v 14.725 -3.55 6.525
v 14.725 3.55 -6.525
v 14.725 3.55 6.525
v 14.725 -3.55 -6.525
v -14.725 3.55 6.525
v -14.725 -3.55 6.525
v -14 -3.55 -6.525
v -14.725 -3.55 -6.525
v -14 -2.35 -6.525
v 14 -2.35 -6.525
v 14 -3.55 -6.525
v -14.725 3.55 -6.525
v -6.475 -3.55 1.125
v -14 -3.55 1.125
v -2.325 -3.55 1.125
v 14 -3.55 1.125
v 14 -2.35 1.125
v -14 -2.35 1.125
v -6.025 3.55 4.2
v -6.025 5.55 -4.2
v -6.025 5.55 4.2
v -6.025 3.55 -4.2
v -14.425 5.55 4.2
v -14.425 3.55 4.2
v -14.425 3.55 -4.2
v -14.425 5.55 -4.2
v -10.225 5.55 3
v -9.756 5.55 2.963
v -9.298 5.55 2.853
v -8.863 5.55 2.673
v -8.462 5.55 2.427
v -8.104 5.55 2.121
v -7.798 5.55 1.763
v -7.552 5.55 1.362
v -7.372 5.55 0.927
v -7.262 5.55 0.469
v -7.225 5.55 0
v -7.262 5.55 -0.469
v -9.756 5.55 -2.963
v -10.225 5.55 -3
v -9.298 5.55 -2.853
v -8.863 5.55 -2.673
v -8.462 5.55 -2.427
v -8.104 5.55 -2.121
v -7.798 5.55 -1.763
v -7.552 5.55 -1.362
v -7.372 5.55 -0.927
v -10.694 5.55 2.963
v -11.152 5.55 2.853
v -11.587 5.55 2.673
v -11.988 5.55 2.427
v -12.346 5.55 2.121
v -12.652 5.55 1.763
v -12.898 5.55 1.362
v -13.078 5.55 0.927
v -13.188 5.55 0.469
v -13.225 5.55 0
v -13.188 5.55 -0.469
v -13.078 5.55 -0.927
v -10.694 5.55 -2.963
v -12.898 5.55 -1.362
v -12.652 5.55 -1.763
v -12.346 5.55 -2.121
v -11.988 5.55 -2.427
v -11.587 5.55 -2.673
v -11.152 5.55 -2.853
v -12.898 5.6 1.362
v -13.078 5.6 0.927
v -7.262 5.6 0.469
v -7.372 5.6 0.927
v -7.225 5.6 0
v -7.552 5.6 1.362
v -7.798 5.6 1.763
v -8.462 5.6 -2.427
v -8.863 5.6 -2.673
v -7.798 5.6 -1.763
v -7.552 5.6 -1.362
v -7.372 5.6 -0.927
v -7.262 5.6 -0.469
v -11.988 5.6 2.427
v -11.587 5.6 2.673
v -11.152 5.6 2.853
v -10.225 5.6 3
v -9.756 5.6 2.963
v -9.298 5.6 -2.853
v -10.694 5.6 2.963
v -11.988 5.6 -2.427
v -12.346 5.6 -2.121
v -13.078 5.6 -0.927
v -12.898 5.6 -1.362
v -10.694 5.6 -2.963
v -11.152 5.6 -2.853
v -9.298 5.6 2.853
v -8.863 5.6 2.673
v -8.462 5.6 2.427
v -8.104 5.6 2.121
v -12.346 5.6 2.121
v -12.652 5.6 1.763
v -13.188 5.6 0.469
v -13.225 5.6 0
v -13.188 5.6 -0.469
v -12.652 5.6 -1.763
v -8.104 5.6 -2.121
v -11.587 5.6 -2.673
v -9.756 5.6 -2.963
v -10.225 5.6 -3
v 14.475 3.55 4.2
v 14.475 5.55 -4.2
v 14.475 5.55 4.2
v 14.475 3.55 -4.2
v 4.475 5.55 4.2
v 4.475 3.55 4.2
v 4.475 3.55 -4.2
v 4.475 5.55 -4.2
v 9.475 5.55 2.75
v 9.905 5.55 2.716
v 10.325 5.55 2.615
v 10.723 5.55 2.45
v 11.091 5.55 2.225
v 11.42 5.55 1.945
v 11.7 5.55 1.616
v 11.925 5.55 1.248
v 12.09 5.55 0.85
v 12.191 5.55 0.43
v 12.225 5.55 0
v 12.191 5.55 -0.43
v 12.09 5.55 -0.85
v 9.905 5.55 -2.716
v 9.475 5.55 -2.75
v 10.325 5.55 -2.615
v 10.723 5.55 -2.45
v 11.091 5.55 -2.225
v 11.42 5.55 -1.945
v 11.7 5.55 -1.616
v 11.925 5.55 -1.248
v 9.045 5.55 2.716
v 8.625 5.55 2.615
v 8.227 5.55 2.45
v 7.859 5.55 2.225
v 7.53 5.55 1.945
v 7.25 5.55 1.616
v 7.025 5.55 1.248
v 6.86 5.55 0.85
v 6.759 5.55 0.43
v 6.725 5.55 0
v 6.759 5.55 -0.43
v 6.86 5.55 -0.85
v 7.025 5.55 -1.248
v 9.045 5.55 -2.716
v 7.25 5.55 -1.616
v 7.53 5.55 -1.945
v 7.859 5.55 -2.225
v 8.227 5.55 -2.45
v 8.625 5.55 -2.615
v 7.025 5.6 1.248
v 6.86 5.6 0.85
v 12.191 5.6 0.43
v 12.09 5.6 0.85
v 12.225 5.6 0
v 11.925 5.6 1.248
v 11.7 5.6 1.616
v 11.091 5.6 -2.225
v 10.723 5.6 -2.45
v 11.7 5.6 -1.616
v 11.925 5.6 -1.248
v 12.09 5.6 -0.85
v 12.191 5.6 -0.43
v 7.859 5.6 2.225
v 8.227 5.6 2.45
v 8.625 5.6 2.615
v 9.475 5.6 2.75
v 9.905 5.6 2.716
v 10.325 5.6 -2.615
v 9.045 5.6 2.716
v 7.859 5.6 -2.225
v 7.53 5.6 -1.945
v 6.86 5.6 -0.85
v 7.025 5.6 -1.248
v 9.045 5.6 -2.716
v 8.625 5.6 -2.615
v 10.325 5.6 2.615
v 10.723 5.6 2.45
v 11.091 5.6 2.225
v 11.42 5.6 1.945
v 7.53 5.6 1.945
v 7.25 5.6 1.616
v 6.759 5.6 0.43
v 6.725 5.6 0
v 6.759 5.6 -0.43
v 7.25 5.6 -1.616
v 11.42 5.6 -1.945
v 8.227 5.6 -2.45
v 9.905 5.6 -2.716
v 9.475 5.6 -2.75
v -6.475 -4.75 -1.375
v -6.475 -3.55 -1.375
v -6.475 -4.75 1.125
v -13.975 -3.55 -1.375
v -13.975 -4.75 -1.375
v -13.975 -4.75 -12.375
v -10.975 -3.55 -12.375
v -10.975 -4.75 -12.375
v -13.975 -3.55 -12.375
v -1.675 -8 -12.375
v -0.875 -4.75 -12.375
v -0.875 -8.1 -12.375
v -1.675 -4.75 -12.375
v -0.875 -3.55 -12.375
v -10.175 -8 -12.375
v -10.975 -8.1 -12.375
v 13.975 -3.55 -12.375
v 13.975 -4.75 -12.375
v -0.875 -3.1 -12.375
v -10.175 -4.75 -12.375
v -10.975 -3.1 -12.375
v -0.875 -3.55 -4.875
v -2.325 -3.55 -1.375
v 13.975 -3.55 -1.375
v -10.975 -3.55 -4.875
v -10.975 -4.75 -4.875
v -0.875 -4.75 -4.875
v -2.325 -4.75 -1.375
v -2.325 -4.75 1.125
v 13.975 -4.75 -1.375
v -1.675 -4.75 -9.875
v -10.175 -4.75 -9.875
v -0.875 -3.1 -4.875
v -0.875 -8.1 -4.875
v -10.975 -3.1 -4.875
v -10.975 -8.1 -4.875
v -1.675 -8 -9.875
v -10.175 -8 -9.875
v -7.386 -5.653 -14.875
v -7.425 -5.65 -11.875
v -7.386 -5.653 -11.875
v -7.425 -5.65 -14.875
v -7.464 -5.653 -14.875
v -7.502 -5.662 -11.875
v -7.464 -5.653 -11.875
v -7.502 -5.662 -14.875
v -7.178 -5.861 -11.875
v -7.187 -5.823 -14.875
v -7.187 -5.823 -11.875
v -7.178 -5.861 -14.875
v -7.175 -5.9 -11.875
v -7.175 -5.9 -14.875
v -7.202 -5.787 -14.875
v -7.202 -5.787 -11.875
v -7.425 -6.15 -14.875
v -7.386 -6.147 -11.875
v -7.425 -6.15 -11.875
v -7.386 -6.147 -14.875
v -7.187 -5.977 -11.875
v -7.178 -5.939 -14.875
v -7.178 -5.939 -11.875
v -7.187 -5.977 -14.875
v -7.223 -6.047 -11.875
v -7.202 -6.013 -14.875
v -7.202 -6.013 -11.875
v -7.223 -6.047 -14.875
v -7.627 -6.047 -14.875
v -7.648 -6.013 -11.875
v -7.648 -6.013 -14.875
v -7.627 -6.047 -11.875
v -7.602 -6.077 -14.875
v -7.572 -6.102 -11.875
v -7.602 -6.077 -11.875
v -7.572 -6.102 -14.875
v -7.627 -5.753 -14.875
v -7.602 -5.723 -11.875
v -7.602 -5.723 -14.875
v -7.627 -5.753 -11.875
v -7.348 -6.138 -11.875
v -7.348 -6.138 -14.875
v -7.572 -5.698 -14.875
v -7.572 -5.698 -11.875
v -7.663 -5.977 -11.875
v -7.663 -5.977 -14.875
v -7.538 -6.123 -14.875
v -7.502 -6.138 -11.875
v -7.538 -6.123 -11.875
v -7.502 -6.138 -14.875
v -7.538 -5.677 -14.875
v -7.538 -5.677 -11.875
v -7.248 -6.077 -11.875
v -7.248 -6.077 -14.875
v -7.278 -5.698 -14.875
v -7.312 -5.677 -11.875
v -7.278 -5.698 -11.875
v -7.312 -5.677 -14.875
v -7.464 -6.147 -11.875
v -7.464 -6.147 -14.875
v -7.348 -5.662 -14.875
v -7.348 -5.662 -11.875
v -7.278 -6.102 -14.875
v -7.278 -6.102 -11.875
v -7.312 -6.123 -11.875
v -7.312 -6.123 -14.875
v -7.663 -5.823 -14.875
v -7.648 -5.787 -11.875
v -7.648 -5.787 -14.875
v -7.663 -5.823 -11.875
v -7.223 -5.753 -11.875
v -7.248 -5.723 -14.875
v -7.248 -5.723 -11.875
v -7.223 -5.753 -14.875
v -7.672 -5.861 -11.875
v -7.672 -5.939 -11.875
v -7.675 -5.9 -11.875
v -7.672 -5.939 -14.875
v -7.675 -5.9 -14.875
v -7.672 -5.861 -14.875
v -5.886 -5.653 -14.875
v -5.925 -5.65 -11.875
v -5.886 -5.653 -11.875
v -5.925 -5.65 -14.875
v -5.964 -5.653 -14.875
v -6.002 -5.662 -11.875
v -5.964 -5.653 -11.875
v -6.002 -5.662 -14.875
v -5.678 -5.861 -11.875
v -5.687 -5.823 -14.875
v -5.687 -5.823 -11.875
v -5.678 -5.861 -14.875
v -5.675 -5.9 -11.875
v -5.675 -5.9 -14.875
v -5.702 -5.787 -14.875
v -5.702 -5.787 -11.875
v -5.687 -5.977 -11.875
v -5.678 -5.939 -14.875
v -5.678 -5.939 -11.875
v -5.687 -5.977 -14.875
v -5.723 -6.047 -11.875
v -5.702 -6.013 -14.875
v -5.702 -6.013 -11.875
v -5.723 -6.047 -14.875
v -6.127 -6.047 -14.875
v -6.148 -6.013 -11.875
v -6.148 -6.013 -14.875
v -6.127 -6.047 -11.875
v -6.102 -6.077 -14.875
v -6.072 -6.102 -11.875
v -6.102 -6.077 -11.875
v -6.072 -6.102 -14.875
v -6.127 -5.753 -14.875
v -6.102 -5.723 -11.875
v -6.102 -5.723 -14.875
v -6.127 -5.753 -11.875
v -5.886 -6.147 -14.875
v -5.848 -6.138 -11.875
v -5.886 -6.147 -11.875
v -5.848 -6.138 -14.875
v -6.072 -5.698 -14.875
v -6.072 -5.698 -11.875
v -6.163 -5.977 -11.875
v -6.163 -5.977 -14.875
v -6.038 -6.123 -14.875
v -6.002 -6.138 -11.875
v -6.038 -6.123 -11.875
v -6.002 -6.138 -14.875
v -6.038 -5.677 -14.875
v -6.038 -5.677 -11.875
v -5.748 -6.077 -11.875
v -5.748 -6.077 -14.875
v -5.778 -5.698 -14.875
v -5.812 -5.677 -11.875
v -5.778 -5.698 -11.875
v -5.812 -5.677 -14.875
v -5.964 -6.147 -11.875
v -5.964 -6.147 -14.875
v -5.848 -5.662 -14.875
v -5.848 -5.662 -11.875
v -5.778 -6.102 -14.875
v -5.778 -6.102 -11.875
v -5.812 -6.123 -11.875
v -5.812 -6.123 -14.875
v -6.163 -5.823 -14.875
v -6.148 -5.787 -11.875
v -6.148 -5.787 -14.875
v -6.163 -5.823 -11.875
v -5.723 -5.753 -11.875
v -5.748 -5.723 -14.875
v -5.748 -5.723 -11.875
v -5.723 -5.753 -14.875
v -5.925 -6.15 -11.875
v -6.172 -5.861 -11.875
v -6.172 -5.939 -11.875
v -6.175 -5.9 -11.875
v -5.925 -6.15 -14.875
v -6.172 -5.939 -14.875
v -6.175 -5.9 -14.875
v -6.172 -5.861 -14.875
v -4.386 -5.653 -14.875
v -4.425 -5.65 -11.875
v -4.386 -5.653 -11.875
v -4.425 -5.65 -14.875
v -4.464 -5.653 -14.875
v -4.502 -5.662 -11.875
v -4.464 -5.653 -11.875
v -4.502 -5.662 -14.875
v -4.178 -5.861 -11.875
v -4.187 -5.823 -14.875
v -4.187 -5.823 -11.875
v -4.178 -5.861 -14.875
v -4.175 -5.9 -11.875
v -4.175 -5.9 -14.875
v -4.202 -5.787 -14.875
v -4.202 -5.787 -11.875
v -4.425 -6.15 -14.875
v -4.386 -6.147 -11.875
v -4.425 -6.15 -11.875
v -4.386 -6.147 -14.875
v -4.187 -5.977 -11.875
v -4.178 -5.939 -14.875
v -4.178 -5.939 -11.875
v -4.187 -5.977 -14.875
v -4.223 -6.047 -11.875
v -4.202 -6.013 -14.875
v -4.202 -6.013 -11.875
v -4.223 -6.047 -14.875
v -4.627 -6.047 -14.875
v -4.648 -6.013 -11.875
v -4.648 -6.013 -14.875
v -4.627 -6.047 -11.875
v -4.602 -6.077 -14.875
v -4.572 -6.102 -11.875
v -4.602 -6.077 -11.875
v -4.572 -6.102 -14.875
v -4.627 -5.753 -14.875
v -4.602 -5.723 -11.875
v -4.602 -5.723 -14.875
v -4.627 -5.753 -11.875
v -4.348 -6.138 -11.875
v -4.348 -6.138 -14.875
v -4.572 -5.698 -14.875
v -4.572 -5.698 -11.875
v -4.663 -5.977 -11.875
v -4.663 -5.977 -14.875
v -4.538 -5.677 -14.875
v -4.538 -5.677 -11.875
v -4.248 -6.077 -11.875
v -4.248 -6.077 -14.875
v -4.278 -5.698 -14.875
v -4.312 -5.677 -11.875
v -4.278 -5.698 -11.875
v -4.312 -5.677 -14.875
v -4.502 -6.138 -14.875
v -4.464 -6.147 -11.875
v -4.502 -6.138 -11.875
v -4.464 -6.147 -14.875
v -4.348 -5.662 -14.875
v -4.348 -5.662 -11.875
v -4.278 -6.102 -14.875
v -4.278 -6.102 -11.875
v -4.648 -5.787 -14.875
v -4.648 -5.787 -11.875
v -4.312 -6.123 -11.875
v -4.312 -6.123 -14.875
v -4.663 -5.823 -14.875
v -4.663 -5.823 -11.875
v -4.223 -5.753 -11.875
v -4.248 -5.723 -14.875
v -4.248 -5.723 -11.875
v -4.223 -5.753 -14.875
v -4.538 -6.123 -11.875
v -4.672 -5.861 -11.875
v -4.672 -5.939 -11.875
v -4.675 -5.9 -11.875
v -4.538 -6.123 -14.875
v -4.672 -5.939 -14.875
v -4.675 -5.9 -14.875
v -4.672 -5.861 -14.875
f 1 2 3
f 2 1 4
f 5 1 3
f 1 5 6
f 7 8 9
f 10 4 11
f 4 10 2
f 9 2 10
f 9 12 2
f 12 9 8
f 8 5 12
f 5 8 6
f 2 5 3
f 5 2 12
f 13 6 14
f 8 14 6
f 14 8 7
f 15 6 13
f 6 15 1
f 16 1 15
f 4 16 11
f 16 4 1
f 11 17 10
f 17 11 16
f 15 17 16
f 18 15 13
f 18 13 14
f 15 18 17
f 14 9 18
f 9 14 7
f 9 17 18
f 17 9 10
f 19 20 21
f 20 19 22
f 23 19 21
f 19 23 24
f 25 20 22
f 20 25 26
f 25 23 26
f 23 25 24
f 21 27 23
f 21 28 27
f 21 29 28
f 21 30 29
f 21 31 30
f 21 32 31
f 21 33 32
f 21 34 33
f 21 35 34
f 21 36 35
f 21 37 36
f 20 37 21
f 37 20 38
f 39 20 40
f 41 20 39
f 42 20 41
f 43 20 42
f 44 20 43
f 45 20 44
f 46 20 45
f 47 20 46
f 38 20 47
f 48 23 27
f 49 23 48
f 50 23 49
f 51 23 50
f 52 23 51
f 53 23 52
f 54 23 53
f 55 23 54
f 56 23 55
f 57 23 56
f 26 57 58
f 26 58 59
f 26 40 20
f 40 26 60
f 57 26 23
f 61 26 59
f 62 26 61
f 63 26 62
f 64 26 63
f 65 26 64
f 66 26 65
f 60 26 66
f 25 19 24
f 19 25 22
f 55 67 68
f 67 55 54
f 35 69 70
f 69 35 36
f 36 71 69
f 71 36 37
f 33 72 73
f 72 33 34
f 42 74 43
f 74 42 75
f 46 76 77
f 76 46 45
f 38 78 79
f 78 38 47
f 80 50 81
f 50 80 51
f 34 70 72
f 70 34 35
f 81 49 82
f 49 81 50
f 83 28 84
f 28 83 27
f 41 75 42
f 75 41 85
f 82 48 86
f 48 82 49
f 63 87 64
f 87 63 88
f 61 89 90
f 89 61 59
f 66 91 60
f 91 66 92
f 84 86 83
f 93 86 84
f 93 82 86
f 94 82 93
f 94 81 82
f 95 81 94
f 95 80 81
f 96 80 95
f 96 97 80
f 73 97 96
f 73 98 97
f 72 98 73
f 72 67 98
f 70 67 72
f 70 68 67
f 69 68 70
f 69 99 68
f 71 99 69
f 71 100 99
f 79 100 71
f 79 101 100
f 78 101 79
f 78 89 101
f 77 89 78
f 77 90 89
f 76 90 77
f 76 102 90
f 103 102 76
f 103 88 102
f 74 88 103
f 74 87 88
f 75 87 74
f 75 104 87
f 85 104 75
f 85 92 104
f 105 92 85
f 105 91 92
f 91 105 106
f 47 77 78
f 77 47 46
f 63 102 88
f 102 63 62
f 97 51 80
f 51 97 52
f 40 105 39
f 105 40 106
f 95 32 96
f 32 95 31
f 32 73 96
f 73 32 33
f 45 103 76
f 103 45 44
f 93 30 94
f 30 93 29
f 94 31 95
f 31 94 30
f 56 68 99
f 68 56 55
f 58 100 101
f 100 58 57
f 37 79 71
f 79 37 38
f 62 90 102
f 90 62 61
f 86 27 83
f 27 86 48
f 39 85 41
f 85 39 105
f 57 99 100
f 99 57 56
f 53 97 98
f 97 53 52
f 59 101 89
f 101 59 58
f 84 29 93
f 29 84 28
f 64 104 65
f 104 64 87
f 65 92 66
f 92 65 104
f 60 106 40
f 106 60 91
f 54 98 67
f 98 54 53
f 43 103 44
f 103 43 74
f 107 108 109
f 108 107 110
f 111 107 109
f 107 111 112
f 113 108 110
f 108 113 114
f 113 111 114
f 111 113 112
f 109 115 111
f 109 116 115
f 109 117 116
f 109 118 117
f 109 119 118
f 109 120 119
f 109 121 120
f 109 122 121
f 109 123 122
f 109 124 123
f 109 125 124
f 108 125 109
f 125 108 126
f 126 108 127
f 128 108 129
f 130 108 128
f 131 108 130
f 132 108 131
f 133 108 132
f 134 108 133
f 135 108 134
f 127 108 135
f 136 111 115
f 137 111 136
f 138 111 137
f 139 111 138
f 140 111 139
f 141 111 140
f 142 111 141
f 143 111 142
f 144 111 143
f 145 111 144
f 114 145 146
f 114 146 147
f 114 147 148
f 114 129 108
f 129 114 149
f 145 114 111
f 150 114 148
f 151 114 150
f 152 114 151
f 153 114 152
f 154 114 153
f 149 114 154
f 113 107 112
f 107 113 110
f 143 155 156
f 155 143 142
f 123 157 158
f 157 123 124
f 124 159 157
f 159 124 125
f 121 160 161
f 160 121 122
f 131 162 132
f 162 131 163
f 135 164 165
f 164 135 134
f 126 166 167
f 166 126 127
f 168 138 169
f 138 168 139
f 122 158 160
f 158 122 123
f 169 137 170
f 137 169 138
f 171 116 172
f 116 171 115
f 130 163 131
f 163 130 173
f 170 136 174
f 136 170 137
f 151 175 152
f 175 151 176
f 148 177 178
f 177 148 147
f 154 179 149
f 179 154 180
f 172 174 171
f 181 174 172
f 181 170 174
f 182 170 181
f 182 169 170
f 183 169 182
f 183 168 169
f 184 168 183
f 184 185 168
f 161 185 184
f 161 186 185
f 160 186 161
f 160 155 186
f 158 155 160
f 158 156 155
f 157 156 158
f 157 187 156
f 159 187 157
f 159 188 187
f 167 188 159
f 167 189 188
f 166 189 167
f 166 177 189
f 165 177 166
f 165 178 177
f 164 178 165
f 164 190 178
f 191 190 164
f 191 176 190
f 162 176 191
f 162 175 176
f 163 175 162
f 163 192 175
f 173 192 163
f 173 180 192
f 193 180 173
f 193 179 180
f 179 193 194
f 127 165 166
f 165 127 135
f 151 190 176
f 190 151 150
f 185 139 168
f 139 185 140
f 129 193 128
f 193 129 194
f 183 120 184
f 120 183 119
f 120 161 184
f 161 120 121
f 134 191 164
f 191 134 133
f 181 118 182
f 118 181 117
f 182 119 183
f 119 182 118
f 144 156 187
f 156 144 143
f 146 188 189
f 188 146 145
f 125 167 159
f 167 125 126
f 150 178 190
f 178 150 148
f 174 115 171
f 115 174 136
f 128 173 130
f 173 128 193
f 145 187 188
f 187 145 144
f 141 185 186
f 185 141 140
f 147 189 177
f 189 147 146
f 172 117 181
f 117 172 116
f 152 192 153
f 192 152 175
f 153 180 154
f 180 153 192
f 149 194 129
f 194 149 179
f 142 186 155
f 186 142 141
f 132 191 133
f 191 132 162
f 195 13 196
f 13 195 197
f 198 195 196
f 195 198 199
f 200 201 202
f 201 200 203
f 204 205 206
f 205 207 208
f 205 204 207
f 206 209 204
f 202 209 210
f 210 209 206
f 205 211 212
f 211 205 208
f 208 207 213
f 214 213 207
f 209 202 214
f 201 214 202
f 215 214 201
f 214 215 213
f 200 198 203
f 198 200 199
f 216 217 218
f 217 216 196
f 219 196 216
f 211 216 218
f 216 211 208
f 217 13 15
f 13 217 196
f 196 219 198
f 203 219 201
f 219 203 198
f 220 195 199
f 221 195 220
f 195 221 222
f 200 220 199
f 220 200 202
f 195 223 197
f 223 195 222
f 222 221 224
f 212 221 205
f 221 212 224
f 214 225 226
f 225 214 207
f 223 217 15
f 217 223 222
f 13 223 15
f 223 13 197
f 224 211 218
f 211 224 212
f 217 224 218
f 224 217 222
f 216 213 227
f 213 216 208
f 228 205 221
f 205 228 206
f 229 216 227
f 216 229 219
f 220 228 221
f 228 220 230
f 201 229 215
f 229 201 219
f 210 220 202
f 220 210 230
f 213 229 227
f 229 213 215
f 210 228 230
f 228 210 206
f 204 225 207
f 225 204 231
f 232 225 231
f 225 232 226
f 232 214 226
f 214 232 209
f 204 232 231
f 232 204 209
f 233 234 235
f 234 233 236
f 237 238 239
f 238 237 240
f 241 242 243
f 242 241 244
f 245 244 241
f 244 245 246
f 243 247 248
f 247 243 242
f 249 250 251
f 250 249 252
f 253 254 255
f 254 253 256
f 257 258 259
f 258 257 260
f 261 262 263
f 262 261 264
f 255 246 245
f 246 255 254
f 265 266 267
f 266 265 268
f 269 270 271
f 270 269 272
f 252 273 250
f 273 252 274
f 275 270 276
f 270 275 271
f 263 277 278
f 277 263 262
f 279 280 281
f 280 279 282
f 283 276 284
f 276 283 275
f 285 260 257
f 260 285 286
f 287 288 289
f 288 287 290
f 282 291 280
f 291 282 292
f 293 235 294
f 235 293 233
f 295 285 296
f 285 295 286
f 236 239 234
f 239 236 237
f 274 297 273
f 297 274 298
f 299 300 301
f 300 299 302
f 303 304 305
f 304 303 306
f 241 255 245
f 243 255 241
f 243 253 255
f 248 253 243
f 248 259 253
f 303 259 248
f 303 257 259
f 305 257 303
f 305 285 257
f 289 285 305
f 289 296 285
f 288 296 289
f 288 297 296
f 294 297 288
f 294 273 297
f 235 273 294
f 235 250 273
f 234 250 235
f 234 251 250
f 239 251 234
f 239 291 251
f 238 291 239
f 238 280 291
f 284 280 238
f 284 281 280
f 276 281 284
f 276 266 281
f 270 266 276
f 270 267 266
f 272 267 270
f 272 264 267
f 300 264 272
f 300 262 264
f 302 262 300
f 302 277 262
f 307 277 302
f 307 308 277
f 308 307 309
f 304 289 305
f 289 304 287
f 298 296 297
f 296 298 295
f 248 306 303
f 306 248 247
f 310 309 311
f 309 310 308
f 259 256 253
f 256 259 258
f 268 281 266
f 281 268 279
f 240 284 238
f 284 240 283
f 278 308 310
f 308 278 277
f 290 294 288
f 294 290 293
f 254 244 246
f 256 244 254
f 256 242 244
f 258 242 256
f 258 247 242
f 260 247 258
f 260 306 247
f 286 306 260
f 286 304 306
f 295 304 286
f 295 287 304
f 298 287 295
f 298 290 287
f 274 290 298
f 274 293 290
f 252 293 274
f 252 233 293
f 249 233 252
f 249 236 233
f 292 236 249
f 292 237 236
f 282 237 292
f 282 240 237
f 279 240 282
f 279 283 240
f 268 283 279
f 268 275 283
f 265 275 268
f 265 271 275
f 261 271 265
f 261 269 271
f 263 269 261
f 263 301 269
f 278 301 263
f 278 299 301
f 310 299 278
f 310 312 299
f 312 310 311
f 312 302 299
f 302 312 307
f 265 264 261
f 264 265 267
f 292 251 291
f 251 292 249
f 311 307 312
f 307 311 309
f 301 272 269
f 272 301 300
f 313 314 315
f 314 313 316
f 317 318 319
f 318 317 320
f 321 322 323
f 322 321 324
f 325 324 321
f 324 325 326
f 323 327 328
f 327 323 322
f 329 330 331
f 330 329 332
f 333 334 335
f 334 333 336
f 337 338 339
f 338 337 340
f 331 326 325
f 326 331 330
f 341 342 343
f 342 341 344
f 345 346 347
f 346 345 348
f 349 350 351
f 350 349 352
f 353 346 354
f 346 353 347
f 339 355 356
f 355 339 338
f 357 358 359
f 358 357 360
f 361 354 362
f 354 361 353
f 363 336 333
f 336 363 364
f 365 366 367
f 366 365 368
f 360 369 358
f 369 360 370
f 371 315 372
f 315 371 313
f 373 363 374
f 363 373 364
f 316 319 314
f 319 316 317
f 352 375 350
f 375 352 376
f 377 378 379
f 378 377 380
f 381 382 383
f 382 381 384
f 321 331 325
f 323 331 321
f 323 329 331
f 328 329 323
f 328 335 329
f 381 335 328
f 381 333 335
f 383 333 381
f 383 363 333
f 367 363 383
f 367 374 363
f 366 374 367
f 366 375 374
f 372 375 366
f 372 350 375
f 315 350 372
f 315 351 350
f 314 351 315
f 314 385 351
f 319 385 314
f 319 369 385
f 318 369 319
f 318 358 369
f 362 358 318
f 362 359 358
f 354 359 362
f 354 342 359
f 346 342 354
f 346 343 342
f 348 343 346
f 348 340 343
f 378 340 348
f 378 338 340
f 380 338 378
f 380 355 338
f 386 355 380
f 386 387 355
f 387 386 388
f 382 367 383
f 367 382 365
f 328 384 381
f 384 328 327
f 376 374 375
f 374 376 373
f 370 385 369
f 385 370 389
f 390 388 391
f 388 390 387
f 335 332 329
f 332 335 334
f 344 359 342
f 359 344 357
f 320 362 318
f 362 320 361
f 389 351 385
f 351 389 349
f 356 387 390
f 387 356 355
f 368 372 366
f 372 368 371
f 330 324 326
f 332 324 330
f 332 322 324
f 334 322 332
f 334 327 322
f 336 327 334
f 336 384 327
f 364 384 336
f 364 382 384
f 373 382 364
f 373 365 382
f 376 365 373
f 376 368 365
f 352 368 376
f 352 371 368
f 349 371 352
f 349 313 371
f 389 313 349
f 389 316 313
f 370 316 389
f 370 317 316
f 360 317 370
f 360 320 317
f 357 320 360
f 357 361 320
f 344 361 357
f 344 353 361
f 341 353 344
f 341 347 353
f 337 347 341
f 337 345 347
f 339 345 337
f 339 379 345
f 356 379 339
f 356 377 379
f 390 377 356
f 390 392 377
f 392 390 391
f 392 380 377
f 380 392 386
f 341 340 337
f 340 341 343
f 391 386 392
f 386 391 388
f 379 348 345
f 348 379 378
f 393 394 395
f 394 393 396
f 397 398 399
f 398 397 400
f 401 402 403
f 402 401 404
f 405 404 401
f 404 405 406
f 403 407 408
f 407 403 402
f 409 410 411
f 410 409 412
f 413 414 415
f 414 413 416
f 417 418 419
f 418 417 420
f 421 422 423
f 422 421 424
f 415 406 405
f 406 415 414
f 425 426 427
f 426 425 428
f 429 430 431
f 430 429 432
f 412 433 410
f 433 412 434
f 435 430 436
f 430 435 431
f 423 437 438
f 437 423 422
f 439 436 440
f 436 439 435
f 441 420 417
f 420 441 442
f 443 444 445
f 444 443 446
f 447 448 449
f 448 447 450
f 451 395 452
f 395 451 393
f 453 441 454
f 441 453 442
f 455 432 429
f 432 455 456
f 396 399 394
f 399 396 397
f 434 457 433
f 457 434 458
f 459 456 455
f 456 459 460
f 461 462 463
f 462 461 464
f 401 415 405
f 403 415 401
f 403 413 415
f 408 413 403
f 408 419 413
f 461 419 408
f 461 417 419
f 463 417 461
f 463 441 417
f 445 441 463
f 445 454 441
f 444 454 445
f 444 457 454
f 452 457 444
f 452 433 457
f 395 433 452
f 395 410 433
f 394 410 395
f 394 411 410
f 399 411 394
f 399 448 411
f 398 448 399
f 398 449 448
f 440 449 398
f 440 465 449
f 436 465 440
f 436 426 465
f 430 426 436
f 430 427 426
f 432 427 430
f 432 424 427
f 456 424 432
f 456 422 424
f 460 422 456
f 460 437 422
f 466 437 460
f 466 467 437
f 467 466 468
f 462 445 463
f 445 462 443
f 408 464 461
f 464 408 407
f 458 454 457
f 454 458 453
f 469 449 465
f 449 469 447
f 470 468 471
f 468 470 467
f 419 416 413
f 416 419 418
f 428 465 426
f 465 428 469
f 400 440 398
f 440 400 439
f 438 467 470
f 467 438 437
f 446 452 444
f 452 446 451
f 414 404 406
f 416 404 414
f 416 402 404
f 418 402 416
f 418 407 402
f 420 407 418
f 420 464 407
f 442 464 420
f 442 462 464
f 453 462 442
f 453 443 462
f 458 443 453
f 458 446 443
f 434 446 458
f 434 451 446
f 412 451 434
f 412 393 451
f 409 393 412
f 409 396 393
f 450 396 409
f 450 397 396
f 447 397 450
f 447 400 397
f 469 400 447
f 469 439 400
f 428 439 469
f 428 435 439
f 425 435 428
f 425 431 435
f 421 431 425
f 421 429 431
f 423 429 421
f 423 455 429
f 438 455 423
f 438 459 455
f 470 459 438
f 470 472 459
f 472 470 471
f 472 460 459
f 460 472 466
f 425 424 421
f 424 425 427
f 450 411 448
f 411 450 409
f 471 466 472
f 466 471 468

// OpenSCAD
// Sharp GP2Y0D413K0F 距離センサ 3Dモデル
// 座標系: 単位 mm, 本体（メインケース）の中心を原点(0, 0, 0)とする。

$fn = 40;

// カラー定義
color_case = [0.18, 0.18, 0.18]; // メインケース（カーボンABS・艶消し黒）
color_lens = [0.1, 0.05, 0.15];   // レンズ（可視光カット樹脂・極暗紫）
color_pwb  = [0.65, 0.5, 0.25];   // PWB基板（紙フェノール・茶黄土色）
color_conn = [0.92, 0.92, 0.88];  // コネクタ（オフホワイト）
color_pin  = [0.85, 0.65, 0.2];   // 金属ピン（真鍮・ゴールド）

// メインモデルの呼び出し
gp2y0d413k0f();

module gp2y0d413k0f() {
    
    // --- 1. メインボディ (Lens Case) ---
    // 幅(W): 29.45, 奥行(D): 7.1, 高さ(H): 13.05
    difference() {
        color(color_case)
            cube([29.45, 7.1, 13.05], center=true);
        
        // 背面のPWB（基板）が収まる凹み
        // 高さ方向は下端(Z=-6.525)から 7.65mm (Z=1.125) まで、深さ 1.2mm
        translate([0, -7.1/2 + 1.2/2 - 0.05, -13.05/2 + 7.65/2 - 0.05])
            cube([28.0, 1.2 + 0.1, 7.65 + 0.1], center=true);
    }

    // --- 2. 光発光部 / Emitter (左側レンズ) ---
    // X位置: 左端(-14.725)から 4.5mm -> X = -10.225
    // Y位置: フロント面(3.55)から前方に 2mm 突出
    translate([-10.225, 7.1/2, 0]) {
        // 四角い台座 (8.4 x 8.4 x 2)
        color(color_case)
            translate([0, 1.0, 0])
                cube([8.4, 2.0, 8.4], center=true);
        // レンズ（丸型）
        color(color_lens)
            translate([0, 2.0, 0])
                rotate([90, 0, 0])
                    cylinder(d=6.0, h=0.1, center=true);
    }

    // --- 3. 光受光部 / Detector (右側レンズ) ---
    // X位置: 左のレンズから 19.7mm -> X = 9.475
    translate([9.475, 7.1/2, 0]) {
        // 横長の台座 (10.0 x 8.4 x 2)
        color(color_case)
            translate([0, 1.0, 0])
                cube([10.0, 2.0, 8.4], center=true);
        // レンズ
        color(color_lens)
            translate([0, 2.0, 0])
                rotate([90, 0, 0])
                    cylinder(d=5.5, h=0.1, center=true);
    }

    // --- 4. PWB (基板) ---
    // 厚さ: 1.2mm, 背面の凹みに配置
    // 背面図の3つのセクション（幅 7.5, 4.15, 16.3）を表現
    pwb_y = -7.1/2 - 1.2/2;
    pwb_bottom = -13.05/2 - 5.85; // コネクタ・PWBの下端 (Z = -12.375)
    
    color(color_pwb) {
        // 左ブロック (幅 7.5, 高さ 11.0)
        translate([-27.95/2 + 7.5/2, pwb_y, pwb_bottom + 11.0/2])
            cube([7.5, 1.2, 11.0], center=true);
            
        // 中央ブロック (幅 4.15, 高さ 13.5)
        translate([-27.95/2 + 7.5 + 4.15/2, pwb_y, pwb_bottom + 13.5/2])
            cube([4.15, 1.2, 13.5], center=true);
            
        // 右ブロック (幅 16.3, 高さ 11.0)
        translate([27.95/2 - 16.3/2, pwb_y, pwb_bottom + 11.0/2])
            cube([16.3, 1.2, 11.0], center=true);
    }

    // --- 5. コネクタ ---
    // 幅: 10.1, 左端から 3.75mm -> X中心 = -5.925 (非対称配置)
    // 奥行(Y): メインボディ背面から後方に 3.3mm 突出
    // 高さ(Z): 本体底面から下に 5.85mm 突出
    conn_x = -14.725 + 3.75 + 10.1/2;
    conn_y = -7.1/2 - 1.2 - 3.3/2;
    conn_w = 10.1;
    conn_d = 5.0; // ケース下部回り込みからPWB背面突起まで
    conn_h = 7.5; // 少しケース内部に食い込ませる
    
    color(color_conn) {
        translate([conn_x, conn_y + 0.8, pwb_bottom + conn_h/2]) {
            difference() {
                cube([conn_w, conn_d, conn_h], center=true);
                // コネクタの差し込み口（中空部）
                translate([0, -0.5, -conn_h/2 + 1.0])
                    cube([conn_w - 1.6, conn_d - 1.2, 3.0], center=true);
            }
        }
    }

    // --- 6. 接続ピン (3ピン) ---
    // ピッチ約 1.5mm で3本のピンを下方向に配置
    for (i = [-1 : 1]) {
        color(color_pin)
            translate([conn_x + i * 1.5, conn_y + 0.5, pwb_bottom - 1.0])
                cylinder(d=0.5, h=3.0, center=true);
    }
}
